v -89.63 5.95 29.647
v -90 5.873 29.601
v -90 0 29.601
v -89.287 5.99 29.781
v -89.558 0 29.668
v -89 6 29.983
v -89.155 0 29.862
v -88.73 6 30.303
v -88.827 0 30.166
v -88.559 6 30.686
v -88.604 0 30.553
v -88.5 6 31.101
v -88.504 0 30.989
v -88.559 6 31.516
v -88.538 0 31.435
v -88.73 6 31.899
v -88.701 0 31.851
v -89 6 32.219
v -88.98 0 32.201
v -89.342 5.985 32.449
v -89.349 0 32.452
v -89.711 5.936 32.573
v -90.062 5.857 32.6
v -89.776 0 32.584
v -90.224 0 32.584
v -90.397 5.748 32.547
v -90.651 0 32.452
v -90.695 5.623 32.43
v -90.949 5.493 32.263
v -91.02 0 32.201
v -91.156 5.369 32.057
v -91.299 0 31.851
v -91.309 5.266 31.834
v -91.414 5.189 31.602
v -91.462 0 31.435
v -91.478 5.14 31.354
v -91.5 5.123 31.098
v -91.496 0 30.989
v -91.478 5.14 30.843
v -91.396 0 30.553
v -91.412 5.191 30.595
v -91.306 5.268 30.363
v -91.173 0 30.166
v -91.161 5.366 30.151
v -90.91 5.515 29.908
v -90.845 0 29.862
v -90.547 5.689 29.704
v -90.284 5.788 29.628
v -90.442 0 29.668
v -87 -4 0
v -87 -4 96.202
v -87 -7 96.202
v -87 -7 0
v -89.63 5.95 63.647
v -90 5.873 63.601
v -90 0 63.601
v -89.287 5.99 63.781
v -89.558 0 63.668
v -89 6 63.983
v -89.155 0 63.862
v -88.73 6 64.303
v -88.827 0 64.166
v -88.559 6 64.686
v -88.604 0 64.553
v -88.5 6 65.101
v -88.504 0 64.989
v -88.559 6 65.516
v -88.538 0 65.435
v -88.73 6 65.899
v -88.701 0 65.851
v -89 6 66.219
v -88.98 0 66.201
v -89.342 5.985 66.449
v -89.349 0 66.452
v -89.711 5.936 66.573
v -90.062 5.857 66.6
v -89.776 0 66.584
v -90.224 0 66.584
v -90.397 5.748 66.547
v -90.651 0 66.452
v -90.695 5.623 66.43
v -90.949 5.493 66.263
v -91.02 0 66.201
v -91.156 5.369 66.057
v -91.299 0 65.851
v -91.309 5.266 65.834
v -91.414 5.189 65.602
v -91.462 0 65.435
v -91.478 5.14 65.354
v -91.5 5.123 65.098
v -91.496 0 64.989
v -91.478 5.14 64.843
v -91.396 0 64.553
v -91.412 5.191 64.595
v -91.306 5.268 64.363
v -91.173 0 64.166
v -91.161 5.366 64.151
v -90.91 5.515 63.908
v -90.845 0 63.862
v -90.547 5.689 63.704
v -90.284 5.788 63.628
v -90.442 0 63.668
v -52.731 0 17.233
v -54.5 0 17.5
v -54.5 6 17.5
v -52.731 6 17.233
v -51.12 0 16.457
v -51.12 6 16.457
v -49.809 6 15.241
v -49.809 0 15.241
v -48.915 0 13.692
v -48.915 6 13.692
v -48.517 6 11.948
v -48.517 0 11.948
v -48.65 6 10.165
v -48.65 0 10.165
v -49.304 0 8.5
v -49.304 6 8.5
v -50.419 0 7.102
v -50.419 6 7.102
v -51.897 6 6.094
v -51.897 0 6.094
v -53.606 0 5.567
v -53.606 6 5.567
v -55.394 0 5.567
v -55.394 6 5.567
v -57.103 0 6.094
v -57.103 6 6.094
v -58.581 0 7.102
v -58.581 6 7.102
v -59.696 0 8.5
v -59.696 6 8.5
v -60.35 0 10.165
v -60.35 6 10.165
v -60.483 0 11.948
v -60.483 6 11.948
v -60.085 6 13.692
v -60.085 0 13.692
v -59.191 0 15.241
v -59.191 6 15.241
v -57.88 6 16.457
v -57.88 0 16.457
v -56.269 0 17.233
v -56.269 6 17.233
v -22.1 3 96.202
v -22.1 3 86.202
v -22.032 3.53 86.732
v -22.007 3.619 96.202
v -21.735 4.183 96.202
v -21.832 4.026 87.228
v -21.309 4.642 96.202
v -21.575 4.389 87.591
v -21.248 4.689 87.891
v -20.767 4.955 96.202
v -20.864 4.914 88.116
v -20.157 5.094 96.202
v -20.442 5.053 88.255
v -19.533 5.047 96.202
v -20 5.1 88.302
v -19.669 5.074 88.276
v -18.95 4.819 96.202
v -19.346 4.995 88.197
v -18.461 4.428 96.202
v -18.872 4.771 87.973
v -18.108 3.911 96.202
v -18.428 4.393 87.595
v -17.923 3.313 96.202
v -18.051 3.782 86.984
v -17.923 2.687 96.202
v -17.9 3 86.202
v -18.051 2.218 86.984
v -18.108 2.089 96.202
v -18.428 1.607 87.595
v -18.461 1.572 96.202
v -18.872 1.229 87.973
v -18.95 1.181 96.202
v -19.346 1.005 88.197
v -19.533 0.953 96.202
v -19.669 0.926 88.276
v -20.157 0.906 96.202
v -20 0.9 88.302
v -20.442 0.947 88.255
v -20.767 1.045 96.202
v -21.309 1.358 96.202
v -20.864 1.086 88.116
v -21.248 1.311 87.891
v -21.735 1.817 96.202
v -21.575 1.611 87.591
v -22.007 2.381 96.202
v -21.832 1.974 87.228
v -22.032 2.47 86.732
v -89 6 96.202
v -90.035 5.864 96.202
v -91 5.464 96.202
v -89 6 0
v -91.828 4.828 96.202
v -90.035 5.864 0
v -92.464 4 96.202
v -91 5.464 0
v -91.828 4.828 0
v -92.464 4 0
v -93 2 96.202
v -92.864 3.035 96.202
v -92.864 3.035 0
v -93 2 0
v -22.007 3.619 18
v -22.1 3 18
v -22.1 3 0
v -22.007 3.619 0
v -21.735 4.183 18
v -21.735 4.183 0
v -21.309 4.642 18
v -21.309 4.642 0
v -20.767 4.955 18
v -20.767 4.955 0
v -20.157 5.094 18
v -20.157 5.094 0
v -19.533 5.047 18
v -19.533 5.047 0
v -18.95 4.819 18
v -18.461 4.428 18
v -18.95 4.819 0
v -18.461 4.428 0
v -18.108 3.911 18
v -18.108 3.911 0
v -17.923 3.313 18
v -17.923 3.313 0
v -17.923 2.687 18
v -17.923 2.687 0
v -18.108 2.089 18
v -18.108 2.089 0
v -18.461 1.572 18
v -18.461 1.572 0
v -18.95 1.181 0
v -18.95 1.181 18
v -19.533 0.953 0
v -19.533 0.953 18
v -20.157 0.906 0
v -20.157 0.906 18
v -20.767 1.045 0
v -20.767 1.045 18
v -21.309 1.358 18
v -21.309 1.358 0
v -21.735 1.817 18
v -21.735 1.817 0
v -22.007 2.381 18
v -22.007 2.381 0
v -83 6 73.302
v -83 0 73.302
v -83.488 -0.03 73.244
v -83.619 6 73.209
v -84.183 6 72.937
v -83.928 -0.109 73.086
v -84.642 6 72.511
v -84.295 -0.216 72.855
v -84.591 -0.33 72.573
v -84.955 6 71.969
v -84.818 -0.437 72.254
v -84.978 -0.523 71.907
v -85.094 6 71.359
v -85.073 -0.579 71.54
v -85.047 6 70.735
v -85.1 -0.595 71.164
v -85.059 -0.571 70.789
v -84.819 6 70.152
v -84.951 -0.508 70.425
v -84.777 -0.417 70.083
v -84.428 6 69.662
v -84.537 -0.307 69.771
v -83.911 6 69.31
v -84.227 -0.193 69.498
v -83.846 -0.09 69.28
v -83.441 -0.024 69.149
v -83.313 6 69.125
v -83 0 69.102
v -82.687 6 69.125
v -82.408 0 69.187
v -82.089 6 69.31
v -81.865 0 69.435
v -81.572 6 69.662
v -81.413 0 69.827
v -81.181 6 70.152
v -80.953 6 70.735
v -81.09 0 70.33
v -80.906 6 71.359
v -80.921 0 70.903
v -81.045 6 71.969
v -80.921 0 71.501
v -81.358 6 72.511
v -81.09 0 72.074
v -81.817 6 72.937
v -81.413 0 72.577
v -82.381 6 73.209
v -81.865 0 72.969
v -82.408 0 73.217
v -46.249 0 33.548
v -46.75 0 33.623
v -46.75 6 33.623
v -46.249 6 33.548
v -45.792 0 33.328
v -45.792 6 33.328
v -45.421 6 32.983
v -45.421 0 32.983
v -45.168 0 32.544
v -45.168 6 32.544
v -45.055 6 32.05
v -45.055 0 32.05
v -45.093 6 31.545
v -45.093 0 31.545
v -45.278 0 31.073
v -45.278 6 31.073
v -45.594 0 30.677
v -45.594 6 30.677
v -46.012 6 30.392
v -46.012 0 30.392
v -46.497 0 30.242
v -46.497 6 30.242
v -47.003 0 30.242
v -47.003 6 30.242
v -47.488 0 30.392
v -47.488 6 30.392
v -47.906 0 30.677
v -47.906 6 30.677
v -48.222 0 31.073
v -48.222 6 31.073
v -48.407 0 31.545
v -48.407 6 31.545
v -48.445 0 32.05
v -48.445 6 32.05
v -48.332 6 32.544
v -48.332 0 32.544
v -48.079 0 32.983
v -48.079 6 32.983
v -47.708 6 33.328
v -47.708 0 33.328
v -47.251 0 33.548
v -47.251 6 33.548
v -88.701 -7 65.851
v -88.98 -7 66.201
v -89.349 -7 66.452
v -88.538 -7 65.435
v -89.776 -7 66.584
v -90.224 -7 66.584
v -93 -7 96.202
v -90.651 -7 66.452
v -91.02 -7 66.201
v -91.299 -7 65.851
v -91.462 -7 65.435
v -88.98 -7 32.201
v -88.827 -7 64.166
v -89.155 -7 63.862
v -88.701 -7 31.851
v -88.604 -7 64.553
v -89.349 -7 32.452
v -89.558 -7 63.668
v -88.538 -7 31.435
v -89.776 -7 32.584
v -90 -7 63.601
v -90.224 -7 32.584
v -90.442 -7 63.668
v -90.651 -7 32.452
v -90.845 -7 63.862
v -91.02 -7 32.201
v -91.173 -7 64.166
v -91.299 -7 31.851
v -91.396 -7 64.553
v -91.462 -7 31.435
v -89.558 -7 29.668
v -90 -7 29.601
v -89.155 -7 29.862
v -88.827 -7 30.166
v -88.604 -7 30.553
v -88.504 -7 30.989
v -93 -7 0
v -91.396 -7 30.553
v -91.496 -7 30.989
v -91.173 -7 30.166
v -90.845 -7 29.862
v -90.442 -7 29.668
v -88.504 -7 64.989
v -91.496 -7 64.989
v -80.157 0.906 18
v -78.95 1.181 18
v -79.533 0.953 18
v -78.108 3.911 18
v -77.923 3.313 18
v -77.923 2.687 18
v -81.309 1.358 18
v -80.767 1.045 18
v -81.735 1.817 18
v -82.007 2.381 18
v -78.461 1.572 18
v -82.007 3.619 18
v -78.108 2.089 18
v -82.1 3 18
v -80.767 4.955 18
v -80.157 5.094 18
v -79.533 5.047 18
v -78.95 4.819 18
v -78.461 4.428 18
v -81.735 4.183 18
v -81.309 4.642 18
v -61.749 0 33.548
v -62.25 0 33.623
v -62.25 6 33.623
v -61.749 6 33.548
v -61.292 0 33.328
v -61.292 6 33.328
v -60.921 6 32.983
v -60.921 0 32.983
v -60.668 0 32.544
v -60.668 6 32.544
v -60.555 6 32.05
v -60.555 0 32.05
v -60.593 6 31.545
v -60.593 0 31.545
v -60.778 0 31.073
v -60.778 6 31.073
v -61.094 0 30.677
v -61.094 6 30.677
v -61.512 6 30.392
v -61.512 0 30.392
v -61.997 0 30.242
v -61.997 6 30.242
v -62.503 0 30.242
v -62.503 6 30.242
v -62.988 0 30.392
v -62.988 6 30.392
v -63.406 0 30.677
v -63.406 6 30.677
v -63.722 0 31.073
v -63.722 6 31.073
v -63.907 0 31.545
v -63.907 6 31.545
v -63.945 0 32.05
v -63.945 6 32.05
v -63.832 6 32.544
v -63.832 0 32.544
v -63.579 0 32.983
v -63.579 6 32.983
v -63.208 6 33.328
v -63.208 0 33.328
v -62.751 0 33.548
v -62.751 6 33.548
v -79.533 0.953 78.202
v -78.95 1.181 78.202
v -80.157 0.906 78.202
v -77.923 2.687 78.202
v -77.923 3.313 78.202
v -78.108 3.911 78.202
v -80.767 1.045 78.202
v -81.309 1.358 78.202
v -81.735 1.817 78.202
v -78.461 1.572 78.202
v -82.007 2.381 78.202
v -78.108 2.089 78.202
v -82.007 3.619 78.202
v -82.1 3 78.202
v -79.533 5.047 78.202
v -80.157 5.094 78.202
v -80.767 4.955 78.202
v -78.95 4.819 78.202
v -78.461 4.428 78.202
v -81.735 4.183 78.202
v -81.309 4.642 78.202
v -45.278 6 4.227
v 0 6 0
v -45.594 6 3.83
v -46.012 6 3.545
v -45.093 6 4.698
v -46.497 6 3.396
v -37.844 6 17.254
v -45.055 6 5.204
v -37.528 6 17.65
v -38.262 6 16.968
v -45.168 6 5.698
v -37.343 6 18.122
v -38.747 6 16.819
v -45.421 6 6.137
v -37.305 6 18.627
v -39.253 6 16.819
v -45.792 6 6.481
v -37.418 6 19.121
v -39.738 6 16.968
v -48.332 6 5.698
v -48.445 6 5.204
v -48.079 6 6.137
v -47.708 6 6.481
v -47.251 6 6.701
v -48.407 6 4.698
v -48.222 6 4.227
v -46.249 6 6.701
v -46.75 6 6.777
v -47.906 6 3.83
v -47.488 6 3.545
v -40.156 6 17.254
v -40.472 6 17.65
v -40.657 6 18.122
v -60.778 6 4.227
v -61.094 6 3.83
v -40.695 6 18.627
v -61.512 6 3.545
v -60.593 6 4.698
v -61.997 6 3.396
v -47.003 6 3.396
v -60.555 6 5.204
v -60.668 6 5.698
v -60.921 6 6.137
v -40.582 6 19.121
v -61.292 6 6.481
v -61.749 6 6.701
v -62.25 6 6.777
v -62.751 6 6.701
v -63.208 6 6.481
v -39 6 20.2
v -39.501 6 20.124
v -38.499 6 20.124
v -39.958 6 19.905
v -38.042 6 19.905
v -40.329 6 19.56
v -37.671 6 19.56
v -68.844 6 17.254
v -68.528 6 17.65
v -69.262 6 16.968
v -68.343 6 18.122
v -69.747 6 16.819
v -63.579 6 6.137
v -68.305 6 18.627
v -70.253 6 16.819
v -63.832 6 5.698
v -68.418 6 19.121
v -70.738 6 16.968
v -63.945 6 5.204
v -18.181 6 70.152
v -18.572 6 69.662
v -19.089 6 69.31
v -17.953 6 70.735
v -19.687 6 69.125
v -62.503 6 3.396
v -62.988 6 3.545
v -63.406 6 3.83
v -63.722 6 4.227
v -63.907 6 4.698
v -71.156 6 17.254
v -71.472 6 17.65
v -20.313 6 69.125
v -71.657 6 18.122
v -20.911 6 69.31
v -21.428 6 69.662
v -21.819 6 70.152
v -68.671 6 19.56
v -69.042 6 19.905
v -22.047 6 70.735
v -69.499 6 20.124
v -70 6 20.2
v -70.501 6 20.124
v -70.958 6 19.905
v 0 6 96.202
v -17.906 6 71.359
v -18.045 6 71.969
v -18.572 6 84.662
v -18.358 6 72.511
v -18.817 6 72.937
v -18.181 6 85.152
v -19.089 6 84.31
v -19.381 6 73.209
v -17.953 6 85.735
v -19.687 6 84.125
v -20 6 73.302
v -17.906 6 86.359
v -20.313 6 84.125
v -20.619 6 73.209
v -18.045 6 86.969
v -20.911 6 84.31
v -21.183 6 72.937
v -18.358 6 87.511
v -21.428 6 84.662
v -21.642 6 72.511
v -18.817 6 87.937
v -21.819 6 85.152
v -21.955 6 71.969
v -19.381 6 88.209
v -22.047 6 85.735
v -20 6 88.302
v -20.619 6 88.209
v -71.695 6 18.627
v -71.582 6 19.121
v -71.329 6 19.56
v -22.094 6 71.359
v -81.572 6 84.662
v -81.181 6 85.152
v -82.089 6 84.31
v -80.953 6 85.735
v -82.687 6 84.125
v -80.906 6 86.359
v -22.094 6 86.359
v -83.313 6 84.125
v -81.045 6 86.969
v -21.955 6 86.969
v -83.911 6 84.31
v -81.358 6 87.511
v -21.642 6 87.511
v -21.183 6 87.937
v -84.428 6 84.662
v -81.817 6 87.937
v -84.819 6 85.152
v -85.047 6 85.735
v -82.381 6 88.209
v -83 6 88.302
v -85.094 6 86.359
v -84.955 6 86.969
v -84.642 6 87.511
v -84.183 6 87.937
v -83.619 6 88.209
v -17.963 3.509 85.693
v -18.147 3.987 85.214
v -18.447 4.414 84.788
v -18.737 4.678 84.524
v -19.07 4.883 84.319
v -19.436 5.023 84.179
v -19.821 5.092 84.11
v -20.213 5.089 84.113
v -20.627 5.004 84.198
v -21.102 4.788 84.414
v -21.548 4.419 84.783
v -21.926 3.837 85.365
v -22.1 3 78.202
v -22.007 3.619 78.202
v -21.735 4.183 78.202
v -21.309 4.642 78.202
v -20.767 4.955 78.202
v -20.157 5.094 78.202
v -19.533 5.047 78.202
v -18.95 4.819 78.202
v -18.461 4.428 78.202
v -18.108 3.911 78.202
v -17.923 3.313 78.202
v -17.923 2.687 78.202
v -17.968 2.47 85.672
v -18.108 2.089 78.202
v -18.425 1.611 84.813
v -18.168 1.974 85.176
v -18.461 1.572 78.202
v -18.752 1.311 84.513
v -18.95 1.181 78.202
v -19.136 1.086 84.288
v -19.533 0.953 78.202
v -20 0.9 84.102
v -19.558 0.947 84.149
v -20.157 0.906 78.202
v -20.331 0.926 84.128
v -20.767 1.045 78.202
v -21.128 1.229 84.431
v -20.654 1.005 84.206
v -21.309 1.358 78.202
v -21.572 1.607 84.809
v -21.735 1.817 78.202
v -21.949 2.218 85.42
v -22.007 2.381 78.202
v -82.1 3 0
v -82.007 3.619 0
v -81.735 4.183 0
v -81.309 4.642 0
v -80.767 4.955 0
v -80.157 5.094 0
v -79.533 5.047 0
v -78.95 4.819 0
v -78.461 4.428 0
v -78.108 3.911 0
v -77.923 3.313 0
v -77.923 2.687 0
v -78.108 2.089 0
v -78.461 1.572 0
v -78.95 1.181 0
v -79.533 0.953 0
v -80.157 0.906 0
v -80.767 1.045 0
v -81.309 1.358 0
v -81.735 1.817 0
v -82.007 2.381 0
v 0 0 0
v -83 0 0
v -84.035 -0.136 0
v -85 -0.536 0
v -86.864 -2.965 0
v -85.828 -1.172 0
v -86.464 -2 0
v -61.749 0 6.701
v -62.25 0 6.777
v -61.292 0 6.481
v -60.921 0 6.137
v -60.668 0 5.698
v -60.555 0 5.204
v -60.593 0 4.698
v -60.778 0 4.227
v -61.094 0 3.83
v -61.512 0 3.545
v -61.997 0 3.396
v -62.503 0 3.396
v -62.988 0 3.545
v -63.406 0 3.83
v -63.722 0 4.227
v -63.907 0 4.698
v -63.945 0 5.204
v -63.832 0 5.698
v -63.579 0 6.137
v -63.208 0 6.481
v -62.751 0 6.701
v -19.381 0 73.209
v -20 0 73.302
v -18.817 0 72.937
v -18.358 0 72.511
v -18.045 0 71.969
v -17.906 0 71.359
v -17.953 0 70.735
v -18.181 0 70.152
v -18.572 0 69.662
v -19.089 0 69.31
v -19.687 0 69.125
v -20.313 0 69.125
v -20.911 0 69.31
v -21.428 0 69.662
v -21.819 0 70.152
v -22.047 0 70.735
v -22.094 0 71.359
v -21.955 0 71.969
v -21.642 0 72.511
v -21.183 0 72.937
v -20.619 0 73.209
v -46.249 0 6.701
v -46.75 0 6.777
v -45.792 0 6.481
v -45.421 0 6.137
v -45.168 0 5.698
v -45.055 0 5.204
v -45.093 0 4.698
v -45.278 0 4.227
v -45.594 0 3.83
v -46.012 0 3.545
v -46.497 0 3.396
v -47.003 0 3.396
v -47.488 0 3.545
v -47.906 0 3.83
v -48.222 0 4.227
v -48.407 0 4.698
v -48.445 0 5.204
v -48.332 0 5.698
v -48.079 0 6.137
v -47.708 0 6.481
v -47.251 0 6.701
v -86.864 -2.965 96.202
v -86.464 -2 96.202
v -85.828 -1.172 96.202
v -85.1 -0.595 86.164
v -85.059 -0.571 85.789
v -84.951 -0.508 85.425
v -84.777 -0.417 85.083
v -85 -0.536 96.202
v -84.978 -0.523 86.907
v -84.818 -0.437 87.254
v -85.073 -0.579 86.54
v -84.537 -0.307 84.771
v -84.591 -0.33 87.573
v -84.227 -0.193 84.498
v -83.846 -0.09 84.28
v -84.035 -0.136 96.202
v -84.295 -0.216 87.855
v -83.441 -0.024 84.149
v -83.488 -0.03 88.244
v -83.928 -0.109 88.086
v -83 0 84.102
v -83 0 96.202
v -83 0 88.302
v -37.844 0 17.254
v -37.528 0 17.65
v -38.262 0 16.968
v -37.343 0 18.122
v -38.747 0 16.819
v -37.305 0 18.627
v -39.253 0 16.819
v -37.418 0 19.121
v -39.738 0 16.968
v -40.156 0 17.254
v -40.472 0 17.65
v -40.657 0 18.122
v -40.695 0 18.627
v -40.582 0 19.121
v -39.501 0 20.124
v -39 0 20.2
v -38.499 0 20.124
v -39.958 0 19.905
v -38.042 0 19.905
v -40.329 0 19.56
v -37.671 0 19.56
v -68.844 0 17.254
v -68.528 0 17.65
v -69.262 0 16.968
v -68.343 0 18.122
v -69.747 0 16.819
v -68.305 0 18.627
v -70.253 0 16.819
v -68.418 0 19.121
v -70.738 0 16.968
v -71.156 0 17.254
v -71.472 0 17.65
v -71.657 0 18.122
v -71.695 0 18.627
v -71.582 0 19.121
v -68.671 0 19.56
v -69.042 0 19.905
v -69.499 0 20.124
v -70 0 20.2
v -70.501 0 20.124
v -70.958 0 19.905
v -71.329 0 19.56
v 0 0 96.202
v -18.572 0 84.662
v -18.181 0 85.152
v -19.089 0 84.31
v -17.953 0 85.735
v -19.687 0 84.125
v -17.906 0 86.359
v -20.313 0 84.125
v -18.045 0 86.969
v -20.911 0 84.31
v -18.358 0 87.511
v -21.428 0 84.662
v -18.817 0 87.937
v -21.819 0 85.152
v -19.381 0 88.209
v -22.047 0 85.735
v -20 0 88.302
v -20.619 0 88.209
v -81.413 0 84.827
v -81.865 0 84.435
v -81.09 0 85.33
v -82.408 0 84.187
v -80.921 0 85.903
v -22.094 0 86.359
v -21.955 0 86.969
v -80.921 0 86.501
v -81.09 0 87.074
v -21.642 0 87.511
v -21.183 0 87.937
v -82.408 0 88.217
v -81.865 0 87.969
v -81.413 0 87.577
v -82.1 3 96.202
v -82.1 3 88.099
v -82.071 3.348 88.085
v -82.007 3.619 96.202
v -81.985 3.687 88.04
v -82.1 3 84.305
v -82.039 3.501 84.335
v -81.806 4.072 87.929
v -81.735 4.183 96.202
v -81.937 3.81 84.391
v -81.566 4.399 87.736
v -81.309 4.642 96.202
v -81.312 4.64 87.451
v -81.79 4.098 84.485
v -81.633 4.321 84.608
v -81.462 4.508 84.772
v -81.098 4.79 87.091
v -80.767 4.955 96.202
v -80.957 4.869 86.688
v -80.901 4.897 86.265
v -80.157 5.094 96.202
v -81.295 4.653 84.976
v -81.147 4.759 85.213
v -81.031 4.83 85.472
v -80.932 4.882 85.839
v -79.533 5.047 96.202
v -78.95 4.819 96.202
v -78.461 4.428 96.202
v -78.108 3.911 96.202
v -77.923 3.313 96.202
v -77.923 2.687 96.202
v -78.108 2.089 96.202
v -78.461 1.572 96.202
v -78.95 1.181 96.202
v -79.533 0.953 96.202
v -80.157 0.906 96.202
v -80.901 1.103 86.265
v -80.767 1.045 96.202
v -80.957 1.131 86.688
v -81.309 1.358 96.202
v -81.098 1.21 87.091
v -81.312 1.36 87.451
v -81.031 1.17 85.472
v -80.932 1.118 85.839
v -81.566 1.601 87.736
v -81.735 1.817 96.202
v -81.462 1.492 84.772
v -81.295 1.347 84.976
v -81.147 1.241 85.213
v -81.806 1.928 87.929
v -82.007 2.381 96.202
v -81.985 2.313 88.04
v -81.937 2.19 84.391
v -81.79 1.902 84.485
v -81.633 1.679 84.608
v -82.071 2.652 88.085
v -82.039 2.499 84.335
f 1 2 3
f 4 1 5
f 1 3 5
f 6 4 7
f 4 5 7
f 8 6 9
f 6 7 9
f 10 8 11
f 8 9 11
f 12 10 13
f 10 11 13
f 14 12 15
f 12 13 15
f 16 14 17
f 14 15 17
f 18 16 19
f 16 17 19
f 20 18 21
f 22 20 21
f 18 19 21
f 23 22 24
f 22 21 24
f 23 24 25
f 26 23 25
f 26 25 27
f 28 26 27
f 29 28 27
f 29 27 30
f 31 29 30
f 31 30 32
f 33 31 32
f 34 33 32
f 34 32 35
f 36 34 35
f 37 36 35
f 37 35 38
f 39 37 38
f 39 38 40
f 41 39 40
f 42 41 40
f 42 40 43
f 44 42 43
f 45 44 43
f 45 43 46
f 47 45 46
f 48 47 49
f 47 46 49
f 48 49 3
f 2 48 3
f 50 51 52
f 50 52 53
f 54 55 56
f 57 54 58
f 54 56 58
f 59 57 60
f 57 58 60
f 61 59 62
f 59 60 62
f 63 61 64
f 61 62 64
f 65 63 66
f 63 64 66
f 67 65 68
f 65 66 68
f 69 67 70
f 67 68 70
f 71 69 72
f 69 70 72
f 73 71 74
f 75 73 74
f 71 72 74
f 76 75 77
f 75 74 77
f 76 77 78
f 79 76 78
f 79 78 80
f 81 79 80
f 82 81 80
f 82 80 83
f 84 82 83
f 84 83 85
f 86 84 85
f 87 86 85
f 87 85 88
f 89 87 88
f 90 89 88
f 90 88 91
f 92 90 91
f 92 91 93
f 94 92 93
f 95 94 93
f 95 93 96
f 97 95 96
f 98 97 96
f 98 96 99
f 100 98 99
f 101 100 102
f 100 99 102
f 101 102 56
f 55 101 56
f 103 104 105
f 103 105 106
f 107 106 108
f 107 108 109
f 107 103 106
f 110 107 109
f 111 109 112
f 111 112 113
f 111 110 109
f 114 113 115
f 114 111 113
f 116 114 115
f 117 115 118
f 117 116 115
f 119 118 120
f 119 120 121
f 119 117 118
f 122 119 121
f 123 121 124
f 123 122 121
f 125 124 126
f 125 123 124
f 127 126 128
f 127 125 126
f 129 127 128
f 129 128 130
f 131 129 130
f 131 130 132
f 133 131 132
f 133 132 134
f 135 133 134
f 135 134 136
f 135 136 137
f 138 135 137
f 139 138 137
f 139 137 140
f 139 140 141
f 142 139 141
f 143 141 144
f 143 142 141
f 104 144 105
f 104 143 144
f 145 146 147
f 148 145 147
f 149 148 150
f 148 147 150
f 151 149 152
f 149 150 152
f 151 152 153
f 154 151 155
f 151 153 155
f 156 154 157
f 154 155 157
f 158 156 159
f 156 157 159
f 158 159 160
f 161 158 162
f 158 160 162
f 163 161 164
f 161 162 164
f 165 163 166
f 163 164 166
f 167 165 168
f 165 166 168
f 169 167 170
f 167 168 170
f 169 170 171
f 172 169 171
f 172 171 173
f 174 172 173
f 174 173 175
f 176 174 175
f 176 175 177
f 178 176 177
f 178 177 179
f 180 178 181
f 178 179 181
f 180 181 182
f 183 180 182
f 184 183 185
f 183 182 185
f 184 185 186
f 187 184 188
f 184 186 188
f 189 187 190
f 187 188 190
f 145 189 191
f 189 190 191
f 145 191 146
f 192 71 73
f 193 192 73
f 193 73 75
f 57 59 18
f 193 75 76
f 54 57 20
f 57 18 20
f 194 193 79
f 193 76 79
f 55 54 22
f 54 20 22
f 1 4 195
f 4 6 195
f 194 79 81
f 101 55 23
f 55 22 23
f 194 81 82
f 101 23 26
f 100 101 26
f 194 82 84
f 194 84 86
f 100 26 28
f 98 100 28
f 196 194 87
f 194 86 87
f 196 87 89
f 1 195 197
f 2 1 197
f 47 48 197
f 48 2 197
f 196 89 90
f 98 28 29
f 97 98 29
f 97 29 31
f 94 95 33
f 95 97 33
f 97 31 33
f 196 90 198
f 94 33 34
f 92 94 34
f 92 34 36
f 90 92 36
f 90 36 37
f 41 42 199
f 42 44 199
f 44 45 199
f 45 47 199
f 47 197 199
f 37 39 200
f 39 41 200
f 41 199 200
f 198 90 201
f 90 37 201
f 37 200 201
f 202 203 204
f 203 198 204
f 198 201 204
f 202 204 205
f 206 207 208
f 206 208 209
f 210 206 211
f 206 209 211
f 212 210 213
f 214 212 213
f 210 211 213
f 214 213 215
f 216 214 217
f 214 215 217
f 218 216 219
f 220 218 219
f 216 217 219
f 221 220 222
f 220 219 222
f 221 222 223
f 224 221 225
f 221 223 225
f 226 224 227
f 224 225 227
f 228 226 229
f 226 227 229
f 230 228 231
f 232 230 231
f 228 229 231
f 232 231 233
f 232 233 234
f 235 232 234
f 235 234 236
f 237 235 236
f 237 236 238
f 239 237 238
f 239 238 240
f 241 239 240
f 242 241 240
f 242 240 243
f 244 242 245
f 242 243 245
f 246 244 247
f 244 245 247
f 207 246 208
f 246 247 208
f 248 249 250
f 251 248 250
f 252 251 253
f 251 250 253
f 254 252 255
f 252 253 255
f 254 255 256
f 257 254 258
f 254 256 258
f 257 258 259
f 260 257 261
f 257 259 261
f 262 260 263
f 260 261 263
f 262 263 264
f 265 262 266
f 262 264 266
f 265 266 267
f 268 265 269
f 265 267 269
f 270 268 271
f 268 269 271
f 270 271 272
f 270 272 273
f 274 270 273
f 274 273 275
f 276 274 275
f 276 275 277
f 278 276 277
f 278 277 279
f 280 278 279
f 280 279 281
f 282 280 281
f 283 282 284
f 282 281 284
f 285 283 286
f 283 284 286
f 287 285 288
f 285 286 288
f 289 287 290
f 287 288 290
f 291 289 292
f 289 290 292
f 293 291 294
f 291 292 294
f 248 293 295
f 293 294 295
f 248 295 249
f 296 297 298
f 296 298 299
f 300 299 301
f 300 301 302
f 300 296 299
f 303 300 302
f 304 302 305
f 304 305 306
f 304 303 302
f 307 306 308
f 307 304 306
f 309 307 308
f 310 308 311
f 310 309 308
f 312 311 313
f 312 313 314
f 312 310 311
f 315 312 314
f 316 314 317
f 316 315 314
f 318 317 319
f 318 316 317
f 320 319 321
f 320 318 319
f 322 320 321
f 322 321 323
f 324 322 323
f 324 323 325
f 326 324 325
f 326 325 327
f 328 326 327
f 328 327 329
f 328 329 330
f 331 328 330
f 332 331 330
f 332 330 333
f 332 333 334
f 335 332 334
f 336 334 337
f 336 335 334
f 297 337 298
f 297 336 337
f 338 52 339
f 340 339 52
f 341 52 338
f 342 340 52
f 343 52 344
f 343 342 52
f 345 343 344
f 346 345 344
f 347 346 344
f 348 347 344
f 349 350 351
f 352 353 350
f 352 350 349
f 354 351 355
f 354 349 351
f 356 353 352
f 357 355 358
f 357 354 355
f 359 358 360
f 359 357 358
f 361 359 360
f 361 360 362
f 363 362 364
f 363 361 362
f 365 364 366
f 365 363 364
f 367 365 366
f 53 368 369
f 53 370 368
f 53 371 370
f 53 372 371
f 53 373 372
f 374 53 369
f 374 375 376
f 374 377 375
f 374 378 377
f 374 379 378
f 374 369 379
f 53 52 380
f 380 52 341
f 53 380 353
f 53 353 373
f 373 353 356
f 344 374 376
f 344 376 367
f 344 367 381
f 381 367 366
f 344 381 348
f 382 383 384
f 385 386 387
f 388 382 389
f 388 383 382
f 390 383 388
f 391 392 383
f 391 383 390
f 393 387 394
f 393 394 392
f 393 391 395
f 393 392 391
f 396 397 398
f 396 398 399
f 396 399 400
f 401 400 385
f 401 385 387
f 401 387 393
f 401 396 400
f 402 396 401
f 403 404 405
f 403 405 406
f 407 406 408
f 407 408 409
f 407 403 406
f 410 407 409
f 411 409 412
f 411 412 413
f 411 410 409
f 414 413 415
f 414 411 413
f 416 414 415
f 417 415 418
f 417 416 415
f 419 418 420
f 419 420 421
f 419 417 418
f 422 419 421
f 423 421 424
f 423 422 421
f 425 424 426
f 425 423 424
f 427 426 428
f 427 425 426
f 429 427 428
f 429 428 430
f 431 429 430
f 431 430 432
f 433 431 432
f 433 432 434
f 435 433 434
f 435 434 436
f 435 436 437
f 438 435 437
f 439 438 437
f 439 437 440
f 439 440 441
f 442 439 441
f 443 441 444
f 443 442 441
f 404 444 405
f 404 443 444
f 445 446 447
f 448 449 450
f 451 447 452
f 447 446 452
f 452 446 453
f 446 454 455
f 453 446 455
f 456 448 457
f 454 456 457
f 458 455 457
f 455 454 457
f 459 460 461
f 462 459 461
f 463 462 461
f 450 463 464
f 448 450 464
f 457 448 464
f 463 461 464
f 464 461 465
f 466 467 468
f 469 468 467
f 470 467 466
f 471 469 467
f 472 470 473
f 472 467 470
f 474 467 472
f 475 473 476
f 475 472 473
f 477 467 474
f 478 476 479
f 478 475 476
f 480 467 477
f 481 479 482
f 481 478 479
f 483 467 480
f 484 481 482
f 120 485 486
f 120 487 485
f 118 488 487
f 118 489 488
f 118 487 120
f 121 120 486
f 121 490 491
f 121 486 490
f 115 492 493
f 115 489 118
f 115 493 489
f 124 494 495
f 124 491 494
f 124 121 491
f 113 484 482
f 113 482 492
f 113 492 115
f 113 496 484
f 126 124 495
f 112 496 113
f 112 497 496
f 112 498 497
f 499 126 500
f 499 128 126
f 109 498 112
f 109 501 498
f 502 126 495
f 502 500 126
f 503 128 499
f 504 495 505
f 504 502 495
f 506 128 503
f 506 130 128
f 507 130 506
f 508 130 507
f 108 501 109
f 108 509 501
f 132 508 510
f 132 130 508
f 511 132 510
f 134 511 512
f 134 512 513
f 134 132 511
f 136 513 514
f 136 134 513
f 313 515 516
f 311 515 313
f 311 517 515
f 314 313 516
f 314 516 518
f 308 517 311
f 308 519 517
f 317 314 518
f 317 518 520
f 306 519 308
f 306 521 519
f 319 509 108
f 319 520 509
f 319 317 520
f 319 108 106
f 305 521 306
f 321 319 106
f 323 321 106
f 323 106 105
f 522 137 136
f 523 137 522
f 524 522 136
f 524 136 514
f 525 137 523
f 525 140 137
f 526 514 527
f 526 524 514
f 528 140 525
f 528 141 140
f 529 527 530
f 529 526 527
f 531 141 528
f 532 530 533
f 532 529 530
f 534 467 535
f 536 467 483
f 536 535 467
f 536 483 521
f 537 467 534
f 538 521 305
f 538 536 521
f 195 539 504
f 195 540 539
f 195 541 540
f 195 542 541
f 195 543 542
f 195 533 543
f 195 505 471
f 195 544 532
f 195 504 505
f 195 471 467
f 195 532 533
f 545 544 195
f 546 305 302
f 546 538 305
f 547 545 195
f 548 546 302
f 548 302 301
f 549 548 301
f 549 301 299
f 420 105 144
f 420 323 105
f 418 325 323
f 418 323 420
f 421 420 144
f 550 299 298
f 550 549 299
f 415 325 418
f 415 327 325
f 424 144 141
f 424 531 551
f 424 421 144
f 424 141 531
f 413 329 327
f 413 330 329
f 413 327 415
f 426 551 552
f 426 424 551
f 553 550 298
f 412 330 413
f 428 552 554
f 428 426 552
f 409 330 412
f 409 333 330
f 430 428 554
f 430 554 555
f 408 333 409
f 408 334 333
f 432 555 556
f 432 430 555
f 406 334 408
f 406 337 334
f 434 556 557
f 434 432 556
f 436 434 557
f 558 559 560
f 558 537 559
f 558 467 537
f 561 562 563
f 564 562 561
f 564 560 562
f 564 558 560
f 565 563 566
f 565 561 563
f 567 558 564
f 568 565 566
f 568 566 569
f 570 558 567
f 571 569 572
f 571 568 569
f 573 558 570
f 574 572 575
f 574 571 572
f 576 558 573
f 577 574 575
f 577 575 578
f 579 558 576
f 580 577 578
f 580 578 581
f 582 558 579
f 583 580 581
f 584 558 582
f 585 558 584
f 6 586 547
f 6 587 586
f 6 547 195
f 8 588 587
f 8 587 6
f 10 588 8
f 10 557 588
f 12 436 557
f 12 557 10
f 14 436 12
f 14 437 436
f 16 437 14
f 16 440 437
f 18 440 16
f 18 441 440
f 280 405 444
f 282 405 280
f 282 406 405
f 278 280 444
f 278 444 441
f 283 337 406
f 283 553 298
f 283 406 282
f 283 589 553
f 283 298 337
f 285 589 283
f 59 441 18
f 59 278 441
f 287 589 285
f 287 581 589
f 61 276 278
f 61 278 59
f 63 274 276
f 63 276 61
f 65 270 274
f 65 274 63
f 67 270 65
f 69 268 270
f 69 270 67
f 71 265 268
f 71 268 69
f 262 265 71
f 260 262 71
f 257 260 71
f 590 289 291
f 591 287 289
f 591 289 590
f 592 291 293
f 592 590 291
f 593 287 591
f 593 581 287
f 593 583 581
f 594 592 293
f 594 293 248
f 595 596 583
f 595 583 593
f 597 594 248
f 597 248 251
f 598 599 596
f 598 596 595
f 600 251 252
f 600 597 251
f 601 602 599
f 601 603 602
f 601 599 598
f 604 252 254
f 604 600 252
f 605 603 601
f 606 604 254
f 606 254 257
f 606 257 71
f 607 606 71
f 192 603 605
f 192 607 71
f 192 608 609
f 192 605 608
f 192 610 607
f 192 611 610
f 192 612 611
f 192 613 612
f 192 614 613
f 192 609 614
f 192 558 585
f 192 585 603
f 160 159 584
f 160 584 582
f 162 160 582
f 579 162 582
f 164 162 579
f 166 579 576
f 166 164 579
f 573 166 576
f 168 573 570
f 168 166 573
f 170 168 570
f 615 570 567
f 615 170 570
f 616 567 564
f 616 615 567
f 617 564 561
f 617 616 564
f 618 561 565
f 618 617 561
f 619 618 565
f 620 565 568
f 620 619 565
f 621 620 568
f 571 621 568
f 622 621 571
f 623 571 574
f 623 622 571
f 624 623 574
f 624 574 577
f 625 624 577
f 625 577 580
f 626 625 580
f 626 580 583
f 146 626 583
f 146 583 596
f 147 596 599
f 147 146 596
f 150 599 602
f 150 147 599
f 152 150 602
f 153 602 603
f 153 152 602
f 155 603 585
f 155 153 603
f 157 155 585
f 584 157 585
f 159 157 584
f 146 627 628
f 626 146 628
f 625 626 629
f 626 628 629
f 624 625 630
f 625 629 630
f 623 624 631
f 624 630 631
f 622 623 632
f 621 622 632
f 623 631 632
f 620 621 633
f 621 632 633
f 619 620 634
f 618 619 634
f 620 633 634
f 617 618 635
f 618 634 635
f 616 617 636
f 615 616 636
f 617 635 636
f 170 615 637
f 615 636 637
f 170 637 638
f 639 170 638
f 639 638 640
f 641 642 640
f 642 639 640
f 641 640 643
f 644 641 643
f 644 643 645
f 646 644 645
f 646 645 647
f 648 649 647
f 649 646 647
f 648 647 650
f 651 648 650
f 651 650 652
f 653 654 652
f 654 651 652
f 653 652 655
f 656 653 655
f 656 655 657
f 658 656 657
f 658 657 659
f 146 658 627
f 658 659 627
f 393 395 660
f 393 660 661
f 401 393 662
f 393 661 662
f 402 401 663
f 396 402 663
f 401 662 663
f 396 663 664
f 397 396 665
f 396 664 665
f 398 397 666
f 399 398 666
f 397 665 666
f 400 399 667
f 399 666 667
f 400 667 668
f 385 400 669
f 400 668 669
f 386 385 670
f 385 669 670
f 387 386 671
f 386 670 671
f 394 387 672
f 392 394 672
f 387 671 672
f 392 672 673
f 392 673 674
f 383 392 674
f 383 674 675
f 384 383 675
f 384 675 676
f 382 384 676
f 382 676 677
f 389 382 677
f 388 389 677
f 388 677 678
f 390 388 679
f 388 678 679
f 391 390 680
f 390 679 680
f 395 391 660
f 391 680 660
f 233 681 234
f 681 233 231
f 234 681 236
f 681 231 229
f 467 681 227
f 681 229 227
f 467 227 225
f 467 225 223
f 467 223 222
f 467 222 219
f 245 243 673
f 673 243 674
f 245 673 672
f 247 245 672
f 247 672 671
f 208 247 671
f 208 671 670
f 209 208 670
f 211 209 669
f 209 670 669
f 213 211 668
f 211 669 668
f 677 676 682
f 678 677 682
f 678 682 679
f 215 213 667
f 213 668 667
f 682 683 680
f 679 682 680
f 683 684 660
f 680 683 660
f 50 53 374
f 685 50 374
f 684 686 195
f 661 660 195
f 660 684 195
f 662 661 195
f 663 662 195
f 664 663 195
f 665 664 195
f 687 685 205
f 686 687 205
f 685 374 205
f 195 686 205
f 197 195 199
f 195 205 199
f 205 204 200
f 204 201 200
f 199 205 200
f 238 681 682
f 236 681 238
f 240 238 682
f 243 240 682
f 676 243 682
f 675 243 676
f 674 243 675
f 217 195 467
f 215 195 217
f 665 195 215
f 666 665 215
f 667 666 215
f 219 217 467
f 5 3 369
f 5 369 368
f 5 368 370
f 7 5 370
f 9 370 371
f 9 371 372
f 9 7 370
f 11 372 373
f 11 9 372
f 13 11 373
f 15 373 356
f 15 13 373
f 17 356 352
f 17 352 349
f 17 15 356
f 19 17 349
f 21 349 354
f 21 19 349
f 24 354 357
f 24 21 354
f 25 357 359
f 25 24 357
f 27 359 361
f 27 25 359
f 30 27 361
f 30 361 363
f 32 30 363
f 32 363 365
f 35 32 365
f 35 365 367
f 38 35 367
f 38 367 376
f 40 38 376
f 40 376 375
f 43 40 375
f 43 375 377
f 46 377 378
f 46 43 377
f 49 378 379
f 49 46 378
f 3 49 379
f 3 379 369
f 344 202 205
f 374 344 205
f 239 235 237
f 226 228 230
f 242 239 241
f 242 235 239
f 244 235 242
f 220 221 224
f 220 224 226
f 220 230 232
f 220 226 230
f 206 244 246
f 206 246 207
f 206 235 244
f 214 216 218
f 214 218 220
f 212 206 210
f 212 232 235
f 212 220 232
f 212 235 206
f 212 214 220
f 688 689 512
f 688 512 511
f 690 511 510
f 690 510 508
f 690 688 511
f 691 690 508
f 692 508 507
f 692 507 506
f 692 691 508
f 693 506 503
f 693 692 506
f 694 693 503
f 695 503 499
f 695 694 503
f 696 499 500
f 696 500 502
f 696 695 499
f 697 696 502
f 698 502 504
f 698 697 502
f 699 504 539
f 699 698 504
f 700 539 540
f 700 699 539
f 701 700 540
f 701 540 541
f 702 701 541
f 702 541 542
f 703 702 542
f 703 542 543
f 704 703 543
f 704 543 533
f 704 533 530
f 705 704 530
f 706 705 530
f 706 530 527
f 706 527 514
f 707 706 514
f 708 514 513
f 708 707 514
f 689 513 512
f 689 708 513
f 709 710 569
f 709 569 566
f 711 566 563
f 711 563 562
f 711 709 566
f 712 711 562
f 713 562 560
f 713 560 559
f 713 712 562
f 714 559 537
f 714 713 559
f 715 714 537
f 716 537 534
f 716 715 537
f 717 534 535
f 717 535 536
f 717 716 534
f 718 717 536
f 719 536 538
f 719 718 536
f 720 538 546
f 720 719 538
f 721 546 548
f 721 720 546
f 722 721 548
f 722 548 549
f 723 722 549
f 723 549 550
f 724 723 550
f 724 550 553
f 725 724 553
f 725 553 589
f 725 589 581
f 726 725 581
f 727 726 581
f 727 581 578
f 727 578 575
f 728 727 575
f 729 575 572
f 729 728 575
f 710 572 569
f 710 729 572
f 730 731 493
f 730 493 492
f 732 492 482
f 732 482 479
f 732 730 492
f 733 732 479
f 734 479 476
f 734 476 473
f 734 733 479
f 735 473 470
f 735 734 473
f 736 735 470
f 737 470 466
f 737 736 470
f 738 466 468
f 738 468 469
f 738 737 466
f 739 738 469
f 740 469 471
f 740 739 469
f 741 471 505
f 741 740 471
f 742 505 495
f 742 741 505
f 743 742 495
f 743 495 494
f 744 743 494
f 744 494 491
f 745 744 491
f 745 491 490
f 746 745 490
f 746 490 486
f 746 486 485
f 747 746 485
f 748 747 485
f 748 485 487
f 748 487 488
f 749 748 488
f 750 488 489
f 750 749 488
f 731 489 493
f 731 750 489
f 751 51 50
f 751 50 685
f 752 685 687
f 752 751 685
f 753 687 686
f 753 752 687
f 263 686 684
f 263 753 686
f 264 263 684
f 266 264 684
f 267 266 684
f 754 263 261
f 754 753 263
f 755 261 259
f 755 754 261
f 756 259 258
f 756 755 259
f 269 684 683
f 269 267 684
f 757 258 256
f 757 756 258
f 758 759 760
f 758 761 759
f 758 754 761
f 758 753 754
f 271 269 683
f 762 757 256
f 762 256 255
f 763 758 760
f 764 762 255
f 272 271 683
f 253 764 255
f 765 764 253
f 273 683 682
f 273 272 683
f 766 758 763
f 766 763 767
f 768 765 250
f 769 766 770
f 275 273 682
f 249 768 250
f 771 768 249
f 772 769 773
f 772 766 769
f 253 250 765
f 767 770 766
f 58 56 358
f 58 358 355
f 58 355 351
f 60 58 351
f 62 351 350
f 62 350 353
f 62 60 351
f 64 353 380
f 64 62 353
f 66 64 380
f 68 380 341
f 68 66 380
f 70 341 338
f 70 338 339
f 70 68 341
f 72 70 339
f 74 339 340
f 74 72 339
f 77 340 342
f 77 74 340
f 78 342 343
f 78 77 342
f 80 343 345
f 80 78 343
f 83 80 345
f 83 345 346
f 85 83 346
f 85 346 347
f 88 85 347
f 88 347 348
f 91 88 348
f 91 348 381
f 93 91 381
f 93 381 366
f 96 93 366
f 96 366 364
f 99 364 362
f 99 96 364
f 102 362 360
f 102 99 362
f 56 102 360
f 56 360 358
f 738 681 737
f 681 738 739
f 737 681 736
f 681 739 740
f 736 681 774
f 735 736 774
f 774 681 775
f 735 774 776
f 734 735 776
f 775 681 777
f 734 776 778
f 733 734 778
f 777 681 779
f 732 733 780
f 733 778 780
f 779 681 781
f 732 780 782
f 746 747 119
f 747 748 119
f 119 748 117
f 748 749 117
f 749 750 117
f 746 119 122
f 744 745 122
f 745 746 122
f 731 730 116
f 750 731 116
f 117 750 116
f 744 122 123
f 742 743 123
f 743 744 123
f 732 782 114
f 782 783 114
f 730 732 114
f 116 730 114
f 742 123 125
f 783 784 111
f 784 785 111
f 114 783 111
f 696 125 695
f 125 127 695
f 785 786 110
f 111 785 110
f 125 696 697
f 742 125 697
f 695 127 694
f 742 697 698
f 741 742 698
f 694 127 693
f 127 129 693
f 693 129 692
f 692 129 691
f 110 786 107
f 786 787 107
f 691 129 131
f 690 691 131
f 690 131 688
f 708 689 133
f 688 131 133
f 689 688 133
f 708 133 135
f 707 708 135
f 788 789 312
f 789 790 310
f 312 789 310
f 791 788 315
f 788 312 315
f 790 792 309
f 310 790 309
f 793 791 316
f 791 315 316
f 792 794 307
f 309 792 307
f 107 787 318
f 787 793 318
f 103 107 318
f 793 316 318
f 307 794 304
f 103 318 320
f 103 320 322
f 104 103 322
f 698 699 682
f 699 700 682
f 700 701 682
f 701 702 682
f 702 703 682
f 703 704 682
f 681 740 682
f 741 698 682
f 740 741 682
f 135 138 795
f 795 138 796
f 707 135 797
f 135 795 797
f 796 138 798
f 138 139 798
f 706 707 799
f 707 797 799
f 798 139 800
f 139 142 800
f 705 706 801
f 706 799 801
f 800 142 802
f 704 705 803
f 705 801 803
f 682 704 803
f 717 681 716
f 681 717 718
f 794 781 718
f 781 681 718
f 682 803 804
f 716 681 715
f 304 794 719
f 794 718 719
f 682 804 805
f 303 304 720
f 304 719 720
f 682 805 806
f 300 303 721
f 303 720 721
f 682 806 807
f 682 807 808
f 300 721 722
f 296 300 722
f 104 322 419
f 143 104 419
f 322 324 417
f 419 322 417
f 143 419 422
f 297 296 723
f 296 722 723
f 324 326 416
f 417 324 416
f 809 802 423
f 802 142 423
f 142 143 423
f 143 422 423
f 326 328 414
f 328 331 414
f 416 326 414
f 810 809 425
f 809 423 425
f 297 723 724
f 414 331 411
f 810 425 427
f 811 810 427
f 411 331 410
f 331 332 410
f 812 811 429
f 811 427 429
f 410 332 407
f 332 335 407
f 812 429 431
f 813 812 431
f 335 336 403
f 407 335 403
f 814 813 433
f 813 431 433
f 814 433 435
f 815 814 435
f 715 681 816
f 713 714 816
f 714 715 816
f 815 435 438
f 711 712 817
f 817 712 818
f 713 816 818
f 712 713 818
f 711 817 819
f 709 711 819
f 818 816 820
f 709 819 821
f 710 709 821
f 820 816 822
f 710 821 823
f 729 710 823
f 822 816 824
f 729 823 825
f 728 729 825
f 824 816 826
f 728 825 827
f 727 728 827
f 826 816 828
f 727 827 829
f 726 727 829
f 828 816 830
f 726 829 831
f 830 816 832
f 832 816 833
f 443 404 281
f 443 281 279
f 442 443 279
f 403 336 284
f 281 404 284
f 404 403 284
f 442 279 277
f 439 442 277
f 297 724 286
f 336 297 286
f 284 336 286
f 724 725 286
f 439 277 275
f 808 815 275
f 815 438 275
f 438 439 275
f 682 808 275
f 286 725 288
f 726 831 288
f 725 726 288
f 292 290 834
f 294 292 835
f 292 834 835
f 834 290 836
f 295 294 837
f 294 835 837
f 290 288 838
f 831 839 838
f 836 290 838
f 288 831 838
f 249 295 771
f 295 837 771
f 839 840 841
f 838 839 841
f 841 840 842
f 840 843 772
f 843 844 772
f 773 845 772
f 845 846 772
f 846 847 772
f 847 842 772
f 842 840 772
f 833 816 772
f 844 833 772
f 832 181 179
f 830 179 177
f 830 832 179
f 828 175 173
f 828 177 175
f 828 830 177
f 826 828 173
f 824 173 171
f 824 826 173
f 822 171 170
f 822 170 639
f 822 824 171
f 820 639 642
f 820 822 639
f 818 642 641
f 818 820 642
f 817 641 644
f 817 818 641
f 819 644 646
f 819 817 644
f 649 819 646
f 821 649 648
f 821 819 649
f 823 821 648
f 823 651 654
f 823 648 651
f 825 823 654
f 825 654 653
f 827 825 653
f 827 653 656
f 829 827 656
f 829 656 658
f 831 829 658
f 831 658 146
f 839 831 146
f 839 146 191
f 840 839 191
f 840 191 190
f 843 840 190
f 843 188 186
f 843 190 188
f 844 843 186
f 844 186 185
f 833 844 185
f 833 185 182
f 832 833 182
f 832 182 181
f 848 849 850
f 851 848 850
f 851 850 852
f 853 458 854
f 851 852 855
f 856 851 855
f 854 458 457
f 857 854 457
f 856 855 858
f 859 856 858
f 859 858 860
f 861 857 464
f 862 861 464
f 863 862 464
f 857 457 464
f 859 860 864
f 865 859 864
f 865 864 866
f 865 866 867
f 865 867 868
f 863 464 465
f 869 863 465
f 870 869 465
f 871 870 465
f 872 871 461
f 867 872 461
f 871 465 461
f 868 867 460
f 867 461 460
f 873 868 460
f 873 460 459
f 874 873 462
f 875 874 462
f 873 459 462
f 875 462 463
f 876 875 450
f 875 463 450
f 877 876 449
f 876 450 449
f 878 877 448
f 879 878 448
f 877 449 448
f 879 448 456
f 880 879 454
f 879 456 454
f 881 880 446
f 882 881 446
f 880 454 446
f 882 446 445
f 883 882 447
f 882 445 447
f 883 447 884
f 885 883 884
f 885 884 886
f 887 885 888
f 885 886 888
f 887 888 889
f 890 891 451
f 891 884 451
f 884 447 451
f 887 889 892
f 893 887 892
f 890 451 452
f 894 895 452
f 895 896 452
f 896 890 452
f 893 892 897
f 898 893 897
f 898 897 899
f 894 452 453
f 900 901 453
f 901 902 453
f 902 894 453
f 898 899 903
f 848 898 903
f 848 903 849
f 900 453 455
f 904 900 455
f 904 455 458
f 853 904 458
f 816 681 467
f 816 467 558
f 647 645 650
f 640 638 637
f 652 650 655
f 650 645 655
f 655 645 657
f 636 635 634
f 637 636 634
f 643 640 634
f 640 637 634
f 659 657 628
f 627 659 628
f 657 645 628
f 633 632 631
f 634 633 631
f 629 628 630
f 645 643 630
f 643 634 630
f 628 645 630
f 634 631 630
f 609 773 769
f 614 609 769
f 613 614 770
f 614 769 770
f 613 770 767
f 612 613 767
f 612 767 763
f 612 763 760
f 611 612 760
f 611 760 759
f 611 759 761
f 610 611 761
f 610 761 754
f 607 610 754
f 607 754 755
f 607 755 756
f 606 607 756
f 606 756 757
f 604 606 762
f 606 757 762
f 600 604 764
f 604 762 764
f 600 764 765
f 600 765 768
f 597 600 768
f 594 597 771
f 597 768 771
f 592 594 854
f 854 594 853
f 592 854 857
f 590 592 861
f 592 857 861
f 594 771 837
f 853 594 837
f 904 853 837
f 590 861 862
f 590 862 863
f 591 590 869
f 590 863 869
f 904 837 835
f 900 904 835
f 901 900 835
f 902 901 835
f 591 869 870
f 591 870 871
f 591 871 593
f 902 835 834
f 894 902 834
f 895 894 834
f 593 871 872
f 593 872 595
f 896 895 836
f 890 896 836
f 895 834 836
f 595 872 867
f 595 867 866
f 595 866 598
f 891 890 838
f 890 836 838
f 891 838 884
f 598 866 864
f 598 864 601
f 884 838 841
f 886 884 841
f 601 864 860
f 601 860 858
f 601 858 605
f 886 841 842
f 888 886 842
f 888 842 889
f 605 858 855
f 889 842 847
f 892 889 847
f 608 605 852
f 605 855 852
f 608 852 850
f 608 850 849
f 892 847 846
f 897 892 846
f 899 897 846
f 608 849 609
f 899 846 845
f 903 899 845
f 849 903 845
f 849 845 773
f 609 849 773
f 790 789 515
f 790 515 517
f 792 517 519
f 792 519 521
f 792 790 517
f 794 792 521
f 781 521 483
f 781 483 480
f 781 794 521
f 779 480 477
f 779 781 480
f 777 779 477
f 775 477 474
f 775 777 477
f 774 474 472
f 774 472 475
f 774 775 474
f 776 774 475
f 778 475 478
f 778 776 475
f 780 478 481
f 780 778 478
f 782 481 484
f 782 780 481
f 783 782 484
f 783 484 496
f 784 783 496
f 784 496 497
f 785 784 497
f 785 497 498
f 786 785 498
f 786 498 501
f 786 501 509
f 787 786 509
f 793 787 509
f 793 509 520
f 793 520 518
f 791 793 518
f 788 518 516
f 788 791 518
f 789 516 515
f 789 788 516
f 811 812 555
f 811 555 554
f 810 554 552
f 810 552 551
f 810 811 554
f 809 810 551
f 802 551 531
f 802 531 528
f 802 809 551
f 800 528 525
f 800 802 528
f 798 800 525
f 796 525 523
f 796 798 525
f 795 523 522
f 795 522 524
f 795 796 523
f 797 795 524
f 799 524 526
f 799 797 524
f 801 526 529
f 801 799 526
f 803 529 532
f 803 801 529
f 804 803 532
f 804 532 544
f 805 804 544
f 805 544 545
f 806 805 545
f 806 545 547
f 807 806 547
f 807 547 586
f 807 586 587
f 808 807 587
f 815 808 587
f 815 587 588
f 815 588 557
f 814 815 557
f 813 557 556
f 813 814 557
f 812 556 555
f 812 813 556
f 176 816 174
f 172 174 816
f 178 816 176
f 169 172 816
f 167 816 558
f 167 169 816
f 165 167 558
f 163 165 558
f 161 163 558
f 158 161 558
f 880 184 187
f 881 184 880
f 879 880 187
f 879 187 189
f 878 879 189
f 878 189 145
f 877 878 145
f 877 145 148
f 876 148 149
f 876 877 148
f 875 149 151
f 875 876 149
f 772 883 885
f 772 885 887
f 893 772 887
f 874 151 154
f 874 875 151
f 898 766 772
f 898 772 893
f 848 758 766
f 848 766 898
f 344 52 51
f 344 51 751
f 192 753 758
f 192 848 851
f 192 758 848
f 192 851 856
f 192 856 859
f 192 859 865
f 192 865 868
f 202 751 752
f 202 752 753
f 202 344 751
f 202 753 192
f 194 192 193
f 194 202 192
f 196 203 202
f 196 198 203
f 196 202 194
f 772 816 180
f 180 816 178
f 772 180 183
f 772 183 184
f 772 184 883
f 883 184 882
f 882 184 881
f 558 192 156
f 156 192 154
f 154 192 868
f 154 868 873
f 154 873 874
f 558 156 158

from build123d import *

# Parameters (mm, degrees)
SKETCH1_W           = 93
SKETCH1_H           = 96.2019
SKETCH1_R           = 6
SKETCH1_R_2         = 1.7
SKETCH1_R_3         = 2.1
BOSS_EXTRUDE1_DEPTH = 6
SKETCH2_W           = 6
SKETCH2_H           = 96.2019
SKETCH2_R           = 1.5
BOSS_EXTRUDE2_DEPTH = 7
SKETCH2_3_R         = 1.5
CUT_EXTRUDE2_DEPTH  = 134.988079931
FILLET1_R           = 4
SKETCH3_R           = 2.1
CUT_EXTRUDE3_DEPTH  = 18
CUT_EXTRUDE4_START  = -78.2019
SKETCH3_2_R         = 2.1
CUT_EXTRUDE4_DEPTH  = 18


with BuildPart() as part:
    # Sketch1 → Boss-Extrude1 (new body)
    with BuildSketch(Plane(origin=(0, 0, 0), x_dir=(-1, 0, 0), z_dir=(0, 1, 0))):
        with Locations((46.5, 48.10095)):
            Rectangle(SKETCH1_W, SKETCH1_H)
        with Locations(Location((54.5, 11.5, 0), (0, 0, 90))):
            Circle(SKETCH1_R, mode=Mode.SUBTRACT)
        with Locations(Location((39, 18.5, 0), (0, 0, 90))):
            Circle(SKETCH1_R_2, mode=Mode.SUBTRACT)
        with Locations(Location((46.75, 31.923393759, 0), (0, 0, 90))):
            Circle(SKETCH1_R_2, mode=Mode.SUBTRACT)
        with Locations(Location((62.25, 31.923393759, 0), (0, 0, 90))):
            Circle(SKETCH1_R_2, mode=Mode.SUBTRACT)
        with Locations(Location((70, 18.5, 0), (0, 0, 90))):
            Circle(SKETCH1_R_2, mode=Mode.SUBTRACT)
        with Locations(Location((62.25, 5.076606241, 0), (0, 0, 90))):
            Circle(SKETCH1_R_2, mode=Mode.SUBTRACT)
        with Locations(Location((46.75, 5.076606241, 0), (0, 0, 90))):
            Circle(SKETCH1_R_2, mode=Mode.SUBTRACT)
        with Locations(Location((20, 86.2019, 0), (0, 0, 90))):
            Circle(SKETCH1_R_3, mode=Mode.SUBTRACT)
        with Locations(Location((83, 86.2019, 0), (0, 0, 90))):
            Circle(SKETCH1_R_3, mode=Mode.SUBTRACT)
        with Locations(Location((83, 71.2019, 0), (0, 0, 90))):
            Circle(SKETCH1_R_3, mode=Mode.SUBTRACT)
        with Locations(Location((20, 71.2019, 0), (0, 0, 90))):
            Circle(SKETCH1_R_3, mode=Mode.SUBTRACT)
    extrude(amount=BOSS_EXTRUDE1_DEPTH)

    # Sketch2 → Boss-Extrude2 (add)
    with BuildSketch(Plane(origin=(0, 0, 0), x_dir=(-1, 0, 0), z_dir=(0, -1, 0))):
        with Locations((90, -48.10095)):
            Rectangle(SKETCH2_W, SKETCH2_H)
        with Locations(Location((90, -65.10095, 0), (0, 0, 90))):
            Circle(SKETCH2_R, mode=Mode.SUBTRACT)
        with Locations(Location((90, -31.10095, 0), (0, 0, 90))):
            Circle(SKETCH2_R, mode=Mode.SUBTRACT)
    extrude(amount=BOSS_EXTRUDE2_DEPTH)

    # Sketch2<3> → Cut-Extrude2 (cut, through all)
    with BuildSketch(Plane(origin=(0, 0, 0), x_dir=(-1, 0, 0), z_dir=(0, -1, 0))):
        with Locations(Location((90, -31.10095, 0), (0, 0, 90))):
            Circle(SKETCH2_3_R)
        with Locations(Location((90, -65.10095, 0), (0, 0, 90))):
            Circle(SKETCH2_3_R)
    extrude(amount=-CUT_EXTRUDE2_DEPTH, mode=Mode.SUBTRACT)

    # Fillet1
    # the kernel refuses this fillet: 4 mm, written as the material it adds along each edge
    with BuildSketch(Plane(origin=(-87, 0, 96.2019), x_dir=(0, -1, 0), z_dir=(0, 0, -1))) as fillet1_piece_1_section:
        with BuildLine():
            CenterArc((FILLET1_R, -FILLET1_R), FILLET1_R, 90, 90)
            Line((0, -FILLET1_R), (0, 0))
            Line((0, 0), (FILLET1_R, 0))
        make_face()
    fillet1_piece_1 = extrude(amount=96.2019, mode=Mode.PRIVATE)
    fillet1_piece_1 = fillet1_piece_1 - Plane(origin=(-83, -0.912137569, 71.2019), x_dir=(0, 0, 1), z_dir=(0, -1, 0)) * Cylinder(2.1, 209, mode=Mode.PRIVATE)
    fillet1_piece_1 = fillet1_piece_1 - Plane(origin=(-83, -0.912137569, 86.2019), x_dir=(0, 0, 1), z_dir=(0, -1, 0)) * Cylinder(2.1, 209, mode=Mode.PRIVATE)
    add(fillet1_piece_1)
    # the kernel refuses this fillet: 4 mm, written as the material it takes off along each edge
    with BuildSketch(Plane(origin=(-93, 6, -10), x_dir=(1, 0, 0), z_dir=(0, 0, 1))) as fillet1_2_piece_1:
        with BuildLine():
            CenterArc((FILLET1_R, -FILLET1_R), FILLET1_R, 90, 90)
            Line((0, -FILLET1_R), (0, 0))
            Line((0, 0), (FILLET1_R, 0))
        make_face()
    extrude(amount=116.2019, mode=Mode.SUBTRACT)

    # Sketch3 → Cut-Extrude3 (cut)
    with BuildSketch(Plane(origin=(0, 0, 0), x_dir=(1, 0, 0), z_dir=(0, 0, -1))):
        with Locations(Location((-80, -3, 0), (0, 0, 180))):
            Circle(SKETCH3_R)
        with Locations(Location((-20, -3, 0), (0, 0, 180))):
            Circle(SKETCH3_R)
    extrude(amount=-CUT_EXTRUDE3_DEPTH, mode=Mode.SUBTRACT)

    # Sketch3<2> → Cut-Extrude4 (cut)
    with BuildSketch(Plane(origin=(0, 0, 0), x_dir=(1, 0, 0), z_dir=(0, 0, -1)).offset(CUT_EXTRUDE4_START)):
        with Locations(Location((-80, -3, 0), (0, 0, 180))):
            Circle(SKETCH3_2_R)
        with Locations(Location((-20, -3, 0), (0, 0, 180))):
            Circle(SKETCH3_2_R)
    extrude(amount=-CUT_EXTRUDE4_DEPTH, mode=Mode.SUBTRACT)


solid = part.part
